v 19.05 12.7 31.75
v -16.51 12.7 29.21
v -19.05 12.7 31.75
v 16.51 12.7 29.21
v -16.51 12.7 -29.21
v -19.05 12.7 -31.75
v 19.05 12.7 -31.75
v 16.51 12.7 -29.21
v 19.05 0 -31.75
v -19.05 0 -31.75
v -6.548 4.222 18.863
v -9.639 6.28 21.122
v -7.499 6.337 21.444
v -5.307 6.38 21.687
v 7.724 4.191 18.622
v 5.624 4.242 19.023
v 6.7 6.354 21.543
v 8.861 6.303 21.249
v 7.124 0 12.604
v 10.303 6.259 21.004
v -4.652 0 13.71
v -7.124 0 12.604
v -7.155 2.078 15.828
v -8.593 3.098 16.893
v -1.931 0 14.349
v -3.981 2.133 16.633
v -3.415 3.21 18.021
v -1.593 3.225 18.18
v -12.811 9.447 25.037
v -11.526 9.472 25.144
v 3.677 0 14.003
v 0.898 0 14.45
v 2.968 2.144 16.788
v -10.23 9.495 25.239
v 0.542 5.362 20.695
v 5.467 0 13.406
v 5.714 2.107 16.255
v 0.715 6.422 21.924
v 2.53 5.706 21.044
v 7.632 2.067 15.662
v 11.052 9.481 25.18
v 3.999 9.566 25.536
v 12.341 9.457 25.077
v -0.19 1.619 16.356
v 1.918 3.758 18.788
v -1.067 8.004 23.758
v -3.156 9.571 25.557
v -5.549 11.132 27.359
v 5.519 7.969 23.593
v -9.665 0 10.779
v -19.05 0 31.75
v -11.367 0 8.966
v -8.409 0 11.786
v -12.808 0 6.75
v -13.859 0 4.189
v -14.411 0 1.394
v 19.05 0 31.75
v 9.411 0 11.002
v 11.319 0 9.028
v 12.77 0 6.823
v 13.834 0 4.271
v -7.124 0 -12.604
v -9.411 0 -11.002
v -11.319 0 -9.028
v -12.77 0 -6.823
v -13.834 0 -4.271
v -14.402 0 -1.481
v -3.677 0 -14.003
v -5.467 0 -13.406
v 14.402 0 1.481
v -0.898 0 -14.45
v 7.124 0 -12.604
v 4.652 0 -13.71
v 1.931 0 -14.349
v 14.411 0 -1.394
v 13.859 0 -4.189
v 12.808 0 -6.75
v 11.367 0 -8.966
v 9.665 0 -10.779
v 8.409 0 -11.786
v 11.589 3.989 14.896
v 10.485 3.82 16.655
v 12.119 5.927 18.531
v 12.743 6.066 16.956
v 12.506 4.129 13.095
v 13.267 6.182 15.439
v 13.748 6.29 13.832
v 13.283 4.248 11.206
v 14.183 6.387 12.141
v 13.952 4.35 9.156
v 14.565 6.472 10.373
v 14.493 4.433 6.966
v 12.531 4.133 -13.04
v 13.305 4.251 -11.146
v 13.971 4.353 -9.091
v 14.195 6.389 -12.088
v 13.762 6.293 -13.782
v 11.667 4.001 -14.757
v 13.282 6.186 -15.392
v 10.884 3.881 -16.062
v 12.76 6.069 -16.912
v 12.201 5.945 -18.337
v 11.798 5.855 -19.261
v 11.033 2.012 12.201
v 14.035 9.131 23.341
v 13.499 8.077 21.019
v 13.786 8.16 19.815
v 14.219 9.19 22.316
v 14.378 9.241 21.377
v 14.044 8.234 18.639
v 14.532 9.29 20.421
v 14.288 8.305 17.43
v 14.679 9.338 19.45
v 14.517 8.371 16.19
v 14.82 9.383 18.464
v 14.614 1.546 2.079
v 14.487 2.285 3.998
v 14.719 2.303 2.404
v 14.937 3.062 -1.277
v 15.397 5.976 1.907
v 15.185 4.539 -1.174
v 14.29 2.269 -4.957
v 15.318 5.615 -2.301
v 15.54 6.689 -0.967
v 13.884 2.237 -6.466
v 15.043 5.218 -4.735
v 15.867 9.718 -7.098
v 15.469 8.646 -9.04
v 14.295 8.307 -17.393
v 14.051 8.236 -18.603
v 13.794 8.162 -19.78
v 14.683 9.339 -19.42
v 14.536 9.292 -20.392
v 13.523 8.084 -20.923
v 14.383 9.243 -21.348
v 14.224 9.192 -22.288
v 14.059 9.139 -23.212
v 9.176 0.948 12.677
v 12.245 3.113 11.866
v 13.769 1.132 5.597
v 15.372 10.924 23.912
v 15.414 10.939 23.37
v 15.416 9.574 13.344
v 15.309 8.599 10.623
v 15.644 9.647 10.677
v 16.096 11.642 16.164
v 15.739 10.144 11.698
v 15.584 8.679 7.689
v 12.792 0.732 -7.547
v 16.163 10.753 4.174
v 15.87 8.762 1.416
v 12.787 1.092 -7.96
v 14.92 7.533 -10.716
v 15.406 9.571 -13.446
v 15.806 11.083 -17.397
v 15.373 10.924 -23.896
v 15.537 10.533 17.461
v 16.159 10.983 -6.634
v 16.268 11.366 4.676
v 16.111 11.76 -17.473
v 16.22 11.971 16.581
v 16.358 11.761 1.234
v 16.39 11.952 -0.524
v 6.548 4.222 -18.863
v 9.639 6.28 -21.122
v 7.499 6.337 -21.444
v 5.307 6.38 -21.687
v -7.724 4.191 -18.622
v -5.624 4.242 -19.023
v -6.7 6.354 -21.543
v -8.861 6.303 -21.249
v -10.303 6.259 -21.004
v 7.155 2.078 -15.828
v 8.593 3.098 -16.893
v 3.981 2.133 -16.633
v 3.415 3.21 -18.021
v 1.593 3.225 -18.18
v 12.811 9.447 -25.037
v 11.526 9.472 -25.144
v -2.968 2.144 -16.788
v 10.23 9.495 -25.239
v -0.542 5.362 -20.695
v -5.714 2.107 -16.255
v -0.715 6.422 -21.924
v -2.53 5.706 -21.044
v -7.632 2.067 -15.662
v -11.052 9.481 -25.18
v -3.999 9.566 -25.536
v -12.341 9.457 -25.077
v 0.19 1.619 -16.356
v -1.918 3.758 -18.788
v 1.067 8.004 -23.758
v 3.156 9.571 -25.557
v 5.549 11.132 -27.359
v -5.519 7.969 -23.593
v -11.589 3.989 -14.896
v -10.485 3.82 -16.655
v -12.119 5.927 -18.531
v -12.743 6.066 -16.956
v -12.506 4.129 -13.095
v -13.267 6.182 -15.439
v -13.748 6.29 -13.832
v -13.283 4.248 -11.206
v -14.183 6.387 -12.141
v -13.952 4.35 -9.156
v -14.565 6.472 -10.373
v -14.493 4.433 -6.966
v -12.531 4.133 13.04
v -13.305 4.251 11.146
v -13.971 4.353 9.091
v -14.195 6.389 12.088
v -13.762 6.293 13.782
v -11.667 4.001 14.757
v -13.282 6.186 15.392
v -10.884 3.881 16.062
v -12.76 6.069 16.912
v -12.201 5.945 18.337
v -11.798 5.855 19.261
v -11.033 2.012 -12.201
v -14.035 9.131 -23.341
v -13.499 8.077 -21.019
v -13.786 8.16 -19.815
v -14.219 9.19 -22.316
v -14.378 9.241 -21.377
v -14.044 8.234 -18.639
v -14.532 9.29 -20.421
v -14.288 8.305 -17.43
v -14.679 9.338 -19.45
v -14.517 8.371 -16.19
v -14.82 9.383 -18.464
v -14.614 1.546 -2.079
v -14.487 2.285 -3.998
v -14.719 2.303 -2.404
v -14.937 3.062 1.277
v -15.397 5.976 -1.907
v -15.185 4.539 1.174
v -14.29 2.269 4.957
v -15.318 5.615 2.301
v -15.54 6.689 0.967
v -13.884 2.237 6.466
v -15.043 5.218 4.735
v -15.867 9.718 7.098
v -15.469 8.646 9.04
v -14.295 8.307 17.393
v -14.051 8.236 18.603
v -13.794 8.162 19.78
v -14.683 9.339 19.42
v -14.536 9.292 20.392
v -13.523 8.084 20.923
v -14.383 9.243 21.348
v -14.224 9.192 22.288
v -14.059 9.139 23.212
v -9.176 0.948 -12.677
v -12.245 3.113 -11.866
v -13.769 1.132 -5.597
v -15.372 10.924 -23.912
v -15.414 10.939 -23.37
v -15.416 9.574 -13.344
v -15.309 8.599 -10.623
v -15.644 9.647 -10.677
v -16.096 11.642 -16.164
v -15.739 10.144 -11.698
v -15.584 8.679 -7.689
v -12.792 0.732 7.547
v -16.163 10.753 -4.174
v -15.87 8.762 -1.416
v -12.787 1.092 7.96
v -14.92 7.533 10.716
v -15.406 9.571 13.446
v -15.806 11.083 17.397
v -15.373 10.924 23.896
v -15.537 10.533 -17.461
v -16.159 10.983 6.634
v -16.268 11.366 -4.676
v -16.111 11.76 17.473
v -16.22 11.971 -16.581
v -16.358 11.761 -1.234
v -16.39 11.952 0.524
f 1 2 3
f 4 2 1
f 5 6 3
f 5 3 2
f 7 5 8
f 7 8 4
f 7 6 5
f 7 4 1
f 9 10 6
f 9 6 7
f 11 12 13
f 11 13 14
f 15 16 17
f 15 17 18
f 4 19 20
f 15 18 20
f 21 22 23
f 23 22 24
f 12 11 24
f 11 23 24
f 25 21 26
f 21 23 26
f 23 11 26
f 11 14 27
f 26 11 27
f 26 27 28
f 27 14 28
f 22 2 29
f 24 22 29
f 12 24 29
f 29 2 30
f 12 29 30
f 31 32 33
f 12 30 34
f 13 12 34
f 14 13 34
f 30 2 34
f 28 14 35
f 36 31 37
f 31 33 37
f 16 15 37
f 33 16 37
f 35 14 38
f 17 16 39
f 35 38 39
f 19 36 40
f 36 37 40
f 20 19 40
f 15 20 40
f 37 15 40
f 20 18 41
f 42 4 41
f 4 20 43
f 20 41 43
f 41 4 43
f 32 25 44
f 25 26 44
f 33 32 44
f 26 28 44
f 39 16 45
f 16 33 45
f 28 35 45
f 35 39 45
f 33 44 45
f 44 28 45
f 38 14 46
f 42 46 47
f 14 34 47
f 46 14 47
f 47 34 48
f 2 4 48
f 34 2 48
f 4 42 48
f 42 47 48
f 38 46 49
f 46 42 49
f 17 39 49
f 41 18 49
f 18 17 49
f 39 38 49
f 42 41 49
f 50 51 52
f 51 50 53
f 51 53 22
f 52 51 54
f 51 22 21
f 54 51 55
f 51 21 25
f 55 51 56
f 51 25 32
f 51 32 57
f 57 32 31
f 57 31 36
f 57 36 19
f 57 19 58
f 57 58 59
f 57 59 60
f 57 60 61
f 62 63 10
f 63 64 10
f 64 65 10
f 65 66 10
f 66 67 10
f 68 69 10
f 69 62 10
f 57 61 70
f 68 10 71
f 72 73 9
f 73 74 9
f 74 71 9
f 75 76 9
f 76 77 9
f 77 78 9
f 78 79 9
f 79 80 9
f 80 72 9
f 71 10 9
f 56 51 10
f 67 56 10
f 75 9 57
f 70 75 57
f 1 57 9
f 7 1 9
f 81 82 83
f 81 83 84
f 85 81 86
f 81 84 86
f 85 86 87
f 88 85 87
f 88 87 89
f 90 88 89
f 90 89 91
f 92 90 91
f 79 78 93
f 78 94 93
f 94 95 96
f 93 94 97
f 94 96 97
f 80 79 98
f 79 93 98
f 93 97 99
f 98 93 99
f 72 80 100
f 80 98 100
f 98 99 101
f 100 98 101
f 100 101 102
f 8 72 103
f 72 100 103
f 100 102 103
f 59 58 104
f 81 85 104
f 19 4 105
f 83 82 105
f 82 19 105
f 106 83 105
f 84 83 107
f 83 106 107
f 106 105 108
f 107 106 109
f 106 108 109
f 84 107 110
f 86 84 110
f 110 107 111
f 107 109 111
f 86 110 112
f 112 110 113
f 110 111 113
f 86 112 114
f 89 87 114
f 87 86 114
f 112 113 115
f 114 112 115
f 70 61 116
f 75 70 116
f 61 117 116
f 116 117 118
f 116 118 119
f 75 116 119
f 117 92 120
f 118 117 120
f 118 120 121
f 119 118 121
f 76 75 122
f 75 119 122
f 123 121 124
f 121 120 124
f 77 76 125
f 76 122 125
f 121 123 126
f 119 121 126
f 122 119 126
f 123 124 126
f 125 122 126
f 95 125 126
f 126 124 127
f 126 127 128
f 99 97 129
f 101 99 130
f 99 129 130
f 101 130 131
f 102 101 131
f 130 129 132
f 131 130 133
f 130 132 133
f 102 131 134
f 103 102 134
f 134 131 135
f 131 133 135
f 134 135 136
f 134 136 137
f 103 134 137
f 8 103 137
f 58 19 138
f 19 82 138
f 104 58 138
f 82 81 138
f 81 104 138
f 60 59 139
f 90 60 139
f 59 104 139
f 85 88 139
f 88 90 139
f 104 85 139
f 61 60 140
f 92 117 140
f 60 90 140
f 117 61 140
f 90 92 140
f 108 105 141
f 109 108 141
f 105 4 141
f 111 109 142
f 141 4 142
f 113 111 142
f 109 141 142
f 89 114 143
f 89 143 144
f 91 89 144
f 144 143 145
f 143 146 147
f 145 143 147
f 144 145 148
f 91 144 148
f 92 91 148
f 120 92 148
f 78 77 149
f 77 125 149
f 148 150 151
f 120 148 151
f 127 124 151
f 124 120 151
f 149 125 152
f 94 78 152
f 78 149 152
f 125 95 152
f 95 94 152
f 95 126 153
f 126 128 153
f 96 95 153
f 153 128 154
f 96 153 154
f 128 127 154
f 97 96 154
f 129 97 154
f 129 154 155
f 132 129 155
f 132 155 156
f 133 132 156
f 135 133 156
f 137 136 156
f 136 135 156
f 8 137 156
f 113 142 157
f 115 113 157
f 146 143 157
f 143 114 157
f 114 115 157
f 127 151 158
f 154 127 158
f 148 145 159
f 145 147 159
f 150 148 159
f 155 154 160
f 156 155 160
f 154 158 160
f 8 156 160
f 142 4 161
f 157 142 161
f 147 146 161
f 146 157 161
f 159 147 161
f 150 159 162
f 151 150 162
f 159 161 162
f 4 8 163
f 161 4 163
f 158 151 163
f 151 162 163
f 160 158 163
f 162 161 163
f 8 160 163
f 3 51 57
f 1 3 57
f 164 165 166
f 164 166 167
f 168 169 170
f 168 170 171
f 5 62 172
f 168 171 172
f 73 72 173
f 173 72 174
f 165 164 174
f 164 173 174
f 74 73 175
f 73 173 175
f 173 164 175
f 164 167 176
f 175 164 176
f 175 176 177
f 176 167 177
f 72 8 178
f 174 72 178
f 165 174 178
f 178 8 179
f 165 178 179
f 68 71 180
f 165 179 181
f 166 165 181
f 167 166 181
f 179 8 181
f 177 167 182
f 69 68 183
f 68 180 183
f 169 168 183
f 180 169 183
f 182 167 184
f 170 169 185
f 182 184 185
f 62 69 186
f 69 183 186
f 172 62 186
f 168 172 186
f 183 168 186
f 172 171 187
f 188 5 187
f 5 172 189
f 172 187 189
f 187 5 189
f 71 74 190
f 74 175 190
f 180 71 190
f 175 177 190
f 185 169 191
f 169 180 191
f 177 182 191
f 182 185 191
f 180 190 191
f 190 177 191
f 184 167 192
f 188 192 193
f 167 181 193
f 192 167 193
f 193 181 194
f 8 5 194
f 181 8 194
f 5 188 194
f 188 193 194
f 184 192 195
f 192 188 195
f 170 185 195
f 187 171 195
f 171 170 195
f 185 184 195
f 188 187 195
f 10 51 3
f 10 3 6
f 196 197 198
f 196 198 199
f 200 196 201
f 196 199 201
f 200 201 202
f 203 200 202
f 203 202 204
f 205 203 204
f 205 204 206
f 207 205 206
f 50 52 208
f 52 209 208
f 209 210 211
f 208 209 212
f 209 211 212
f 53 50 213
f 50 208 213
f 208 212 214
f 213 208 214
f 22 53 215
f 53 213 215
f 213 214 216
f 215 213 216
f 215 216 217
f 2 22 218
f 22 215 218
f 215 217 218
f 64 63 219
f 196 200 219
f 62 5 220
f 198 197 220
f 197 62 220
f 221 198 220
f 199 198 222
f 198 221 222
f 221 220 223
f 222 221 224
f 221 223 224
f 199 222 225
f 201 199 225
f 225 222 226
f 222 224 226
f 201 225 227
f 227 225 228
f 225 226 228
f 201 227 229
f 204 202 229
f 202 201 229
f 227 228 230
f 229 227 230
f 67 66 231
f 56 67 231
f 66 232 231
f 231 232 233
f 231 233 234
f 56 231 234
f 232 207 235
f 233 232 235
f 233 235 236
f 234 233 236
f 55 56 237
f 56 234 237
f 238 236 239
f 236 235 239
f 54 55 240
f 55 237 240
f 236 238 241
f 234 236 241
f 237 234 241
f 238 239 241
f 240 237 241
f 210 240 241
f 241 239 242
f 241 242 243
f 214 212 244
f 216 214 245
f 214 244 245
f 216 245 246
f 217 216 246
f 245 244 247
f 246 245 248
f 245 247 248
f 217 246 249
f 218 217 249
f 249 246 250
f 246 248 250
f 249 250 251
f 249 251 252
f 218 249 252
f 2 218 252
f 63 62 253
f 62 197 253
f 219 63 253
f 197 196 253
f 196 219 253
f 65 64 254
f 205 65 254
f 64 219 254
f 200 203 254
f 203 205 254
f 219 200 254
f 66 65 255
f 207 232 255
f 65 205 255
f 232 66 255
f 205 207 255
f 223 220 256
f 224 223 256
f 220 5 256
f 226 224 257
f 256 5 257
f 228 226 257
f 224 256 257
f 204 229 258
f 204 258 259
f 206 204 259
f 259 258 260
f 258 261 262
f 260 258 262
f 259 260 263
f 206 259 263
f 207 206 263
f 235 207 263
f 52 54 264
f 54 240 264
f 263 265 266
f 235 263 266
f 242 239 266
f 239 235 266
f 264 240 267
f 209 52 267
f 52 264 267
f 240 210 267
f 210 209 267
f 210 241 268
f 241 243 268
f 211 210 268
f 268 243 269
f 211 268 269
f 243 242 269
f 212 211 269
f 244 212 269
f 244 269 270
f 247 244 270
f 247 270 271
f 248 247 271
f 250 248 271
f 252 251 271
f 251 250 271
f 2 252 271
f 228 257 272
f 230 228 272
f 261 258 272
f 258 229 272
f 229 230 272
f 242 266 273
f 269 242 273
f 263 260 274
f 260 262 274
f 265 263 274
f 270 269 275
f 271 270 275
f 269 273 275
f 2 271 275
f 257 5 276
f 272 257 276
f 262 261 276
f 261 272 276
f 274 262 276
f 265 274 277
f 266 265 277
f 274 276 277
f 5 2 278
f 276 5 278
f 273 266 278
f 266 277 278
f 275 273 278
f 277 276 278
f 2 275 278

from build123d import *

# Parameters (mm, degrees)
SKETCH1_W           = 38.1
SKETCH1_H           = 63.5
BOSS_EXTRUDE1_DEPTH = 12.7


with BuildPart() as part:
    # Sketch1 → Boss-Extrude1 (new body)
    with BuildSketch(Plane(origin=(0, 0, 0), x_dir=(1, 0, 0), z_dir=(0, 1, 0))):
        Rectangle(SKETCH1_W, SKETCH1_H)
    extrude(amount=BOSS_EXTRUDE1_DEPTH)

    # Sketch2 for Cut-Loft1 → Cut-Loft1 section 0
    with BuildSketch(Plane.XZ):
        with BuildLine():
            # circular arc as an exact rational Bezier (weights 1, cos(half-angle), 1)
            Bezier((-7.124004962, 12.604008779), (0, 16.630620279), (7.124004962, 12.604008779), weights=[1, 0.870562839, 1])
            Bezier((7.124004962, 12.604008779), (29.42340511, 0), (7.124004962, -12.604008779), weights=[1, 0.492057257, 1])
            Bezier((7.124004962, -12.604008779), (0, -16.630620279), (-7.124004962, -12.604008779), weights=[1, 0.870562839, 1])
            Bezier((-7.124004962, -12.604008779), (-29.42340511, 0), (-7.124004962, 12.604008779), weights=[1, 0.492057257, 1])
        make_face()
    # Sketch4 → Cut-Loft1 section 1
    with BuildSketch(Plane(origin=(0, 12.7, 0), x_dir=(1, 0, 0), z_dir=(0, 1, 0))):
        with BuildLine():
            Line((-16.51, -29.21), (16.51, -29.21))
            Line((16.51, -29.21), (16.51, 29.21))
            Line((16.51, 29.21), (-16.51, 29.21))
            Line((-16.51, 29.21), (-16.51, -29.21))
        make_face()
    loft(mode=Mode.SUBTRACT)


solid = part.part
